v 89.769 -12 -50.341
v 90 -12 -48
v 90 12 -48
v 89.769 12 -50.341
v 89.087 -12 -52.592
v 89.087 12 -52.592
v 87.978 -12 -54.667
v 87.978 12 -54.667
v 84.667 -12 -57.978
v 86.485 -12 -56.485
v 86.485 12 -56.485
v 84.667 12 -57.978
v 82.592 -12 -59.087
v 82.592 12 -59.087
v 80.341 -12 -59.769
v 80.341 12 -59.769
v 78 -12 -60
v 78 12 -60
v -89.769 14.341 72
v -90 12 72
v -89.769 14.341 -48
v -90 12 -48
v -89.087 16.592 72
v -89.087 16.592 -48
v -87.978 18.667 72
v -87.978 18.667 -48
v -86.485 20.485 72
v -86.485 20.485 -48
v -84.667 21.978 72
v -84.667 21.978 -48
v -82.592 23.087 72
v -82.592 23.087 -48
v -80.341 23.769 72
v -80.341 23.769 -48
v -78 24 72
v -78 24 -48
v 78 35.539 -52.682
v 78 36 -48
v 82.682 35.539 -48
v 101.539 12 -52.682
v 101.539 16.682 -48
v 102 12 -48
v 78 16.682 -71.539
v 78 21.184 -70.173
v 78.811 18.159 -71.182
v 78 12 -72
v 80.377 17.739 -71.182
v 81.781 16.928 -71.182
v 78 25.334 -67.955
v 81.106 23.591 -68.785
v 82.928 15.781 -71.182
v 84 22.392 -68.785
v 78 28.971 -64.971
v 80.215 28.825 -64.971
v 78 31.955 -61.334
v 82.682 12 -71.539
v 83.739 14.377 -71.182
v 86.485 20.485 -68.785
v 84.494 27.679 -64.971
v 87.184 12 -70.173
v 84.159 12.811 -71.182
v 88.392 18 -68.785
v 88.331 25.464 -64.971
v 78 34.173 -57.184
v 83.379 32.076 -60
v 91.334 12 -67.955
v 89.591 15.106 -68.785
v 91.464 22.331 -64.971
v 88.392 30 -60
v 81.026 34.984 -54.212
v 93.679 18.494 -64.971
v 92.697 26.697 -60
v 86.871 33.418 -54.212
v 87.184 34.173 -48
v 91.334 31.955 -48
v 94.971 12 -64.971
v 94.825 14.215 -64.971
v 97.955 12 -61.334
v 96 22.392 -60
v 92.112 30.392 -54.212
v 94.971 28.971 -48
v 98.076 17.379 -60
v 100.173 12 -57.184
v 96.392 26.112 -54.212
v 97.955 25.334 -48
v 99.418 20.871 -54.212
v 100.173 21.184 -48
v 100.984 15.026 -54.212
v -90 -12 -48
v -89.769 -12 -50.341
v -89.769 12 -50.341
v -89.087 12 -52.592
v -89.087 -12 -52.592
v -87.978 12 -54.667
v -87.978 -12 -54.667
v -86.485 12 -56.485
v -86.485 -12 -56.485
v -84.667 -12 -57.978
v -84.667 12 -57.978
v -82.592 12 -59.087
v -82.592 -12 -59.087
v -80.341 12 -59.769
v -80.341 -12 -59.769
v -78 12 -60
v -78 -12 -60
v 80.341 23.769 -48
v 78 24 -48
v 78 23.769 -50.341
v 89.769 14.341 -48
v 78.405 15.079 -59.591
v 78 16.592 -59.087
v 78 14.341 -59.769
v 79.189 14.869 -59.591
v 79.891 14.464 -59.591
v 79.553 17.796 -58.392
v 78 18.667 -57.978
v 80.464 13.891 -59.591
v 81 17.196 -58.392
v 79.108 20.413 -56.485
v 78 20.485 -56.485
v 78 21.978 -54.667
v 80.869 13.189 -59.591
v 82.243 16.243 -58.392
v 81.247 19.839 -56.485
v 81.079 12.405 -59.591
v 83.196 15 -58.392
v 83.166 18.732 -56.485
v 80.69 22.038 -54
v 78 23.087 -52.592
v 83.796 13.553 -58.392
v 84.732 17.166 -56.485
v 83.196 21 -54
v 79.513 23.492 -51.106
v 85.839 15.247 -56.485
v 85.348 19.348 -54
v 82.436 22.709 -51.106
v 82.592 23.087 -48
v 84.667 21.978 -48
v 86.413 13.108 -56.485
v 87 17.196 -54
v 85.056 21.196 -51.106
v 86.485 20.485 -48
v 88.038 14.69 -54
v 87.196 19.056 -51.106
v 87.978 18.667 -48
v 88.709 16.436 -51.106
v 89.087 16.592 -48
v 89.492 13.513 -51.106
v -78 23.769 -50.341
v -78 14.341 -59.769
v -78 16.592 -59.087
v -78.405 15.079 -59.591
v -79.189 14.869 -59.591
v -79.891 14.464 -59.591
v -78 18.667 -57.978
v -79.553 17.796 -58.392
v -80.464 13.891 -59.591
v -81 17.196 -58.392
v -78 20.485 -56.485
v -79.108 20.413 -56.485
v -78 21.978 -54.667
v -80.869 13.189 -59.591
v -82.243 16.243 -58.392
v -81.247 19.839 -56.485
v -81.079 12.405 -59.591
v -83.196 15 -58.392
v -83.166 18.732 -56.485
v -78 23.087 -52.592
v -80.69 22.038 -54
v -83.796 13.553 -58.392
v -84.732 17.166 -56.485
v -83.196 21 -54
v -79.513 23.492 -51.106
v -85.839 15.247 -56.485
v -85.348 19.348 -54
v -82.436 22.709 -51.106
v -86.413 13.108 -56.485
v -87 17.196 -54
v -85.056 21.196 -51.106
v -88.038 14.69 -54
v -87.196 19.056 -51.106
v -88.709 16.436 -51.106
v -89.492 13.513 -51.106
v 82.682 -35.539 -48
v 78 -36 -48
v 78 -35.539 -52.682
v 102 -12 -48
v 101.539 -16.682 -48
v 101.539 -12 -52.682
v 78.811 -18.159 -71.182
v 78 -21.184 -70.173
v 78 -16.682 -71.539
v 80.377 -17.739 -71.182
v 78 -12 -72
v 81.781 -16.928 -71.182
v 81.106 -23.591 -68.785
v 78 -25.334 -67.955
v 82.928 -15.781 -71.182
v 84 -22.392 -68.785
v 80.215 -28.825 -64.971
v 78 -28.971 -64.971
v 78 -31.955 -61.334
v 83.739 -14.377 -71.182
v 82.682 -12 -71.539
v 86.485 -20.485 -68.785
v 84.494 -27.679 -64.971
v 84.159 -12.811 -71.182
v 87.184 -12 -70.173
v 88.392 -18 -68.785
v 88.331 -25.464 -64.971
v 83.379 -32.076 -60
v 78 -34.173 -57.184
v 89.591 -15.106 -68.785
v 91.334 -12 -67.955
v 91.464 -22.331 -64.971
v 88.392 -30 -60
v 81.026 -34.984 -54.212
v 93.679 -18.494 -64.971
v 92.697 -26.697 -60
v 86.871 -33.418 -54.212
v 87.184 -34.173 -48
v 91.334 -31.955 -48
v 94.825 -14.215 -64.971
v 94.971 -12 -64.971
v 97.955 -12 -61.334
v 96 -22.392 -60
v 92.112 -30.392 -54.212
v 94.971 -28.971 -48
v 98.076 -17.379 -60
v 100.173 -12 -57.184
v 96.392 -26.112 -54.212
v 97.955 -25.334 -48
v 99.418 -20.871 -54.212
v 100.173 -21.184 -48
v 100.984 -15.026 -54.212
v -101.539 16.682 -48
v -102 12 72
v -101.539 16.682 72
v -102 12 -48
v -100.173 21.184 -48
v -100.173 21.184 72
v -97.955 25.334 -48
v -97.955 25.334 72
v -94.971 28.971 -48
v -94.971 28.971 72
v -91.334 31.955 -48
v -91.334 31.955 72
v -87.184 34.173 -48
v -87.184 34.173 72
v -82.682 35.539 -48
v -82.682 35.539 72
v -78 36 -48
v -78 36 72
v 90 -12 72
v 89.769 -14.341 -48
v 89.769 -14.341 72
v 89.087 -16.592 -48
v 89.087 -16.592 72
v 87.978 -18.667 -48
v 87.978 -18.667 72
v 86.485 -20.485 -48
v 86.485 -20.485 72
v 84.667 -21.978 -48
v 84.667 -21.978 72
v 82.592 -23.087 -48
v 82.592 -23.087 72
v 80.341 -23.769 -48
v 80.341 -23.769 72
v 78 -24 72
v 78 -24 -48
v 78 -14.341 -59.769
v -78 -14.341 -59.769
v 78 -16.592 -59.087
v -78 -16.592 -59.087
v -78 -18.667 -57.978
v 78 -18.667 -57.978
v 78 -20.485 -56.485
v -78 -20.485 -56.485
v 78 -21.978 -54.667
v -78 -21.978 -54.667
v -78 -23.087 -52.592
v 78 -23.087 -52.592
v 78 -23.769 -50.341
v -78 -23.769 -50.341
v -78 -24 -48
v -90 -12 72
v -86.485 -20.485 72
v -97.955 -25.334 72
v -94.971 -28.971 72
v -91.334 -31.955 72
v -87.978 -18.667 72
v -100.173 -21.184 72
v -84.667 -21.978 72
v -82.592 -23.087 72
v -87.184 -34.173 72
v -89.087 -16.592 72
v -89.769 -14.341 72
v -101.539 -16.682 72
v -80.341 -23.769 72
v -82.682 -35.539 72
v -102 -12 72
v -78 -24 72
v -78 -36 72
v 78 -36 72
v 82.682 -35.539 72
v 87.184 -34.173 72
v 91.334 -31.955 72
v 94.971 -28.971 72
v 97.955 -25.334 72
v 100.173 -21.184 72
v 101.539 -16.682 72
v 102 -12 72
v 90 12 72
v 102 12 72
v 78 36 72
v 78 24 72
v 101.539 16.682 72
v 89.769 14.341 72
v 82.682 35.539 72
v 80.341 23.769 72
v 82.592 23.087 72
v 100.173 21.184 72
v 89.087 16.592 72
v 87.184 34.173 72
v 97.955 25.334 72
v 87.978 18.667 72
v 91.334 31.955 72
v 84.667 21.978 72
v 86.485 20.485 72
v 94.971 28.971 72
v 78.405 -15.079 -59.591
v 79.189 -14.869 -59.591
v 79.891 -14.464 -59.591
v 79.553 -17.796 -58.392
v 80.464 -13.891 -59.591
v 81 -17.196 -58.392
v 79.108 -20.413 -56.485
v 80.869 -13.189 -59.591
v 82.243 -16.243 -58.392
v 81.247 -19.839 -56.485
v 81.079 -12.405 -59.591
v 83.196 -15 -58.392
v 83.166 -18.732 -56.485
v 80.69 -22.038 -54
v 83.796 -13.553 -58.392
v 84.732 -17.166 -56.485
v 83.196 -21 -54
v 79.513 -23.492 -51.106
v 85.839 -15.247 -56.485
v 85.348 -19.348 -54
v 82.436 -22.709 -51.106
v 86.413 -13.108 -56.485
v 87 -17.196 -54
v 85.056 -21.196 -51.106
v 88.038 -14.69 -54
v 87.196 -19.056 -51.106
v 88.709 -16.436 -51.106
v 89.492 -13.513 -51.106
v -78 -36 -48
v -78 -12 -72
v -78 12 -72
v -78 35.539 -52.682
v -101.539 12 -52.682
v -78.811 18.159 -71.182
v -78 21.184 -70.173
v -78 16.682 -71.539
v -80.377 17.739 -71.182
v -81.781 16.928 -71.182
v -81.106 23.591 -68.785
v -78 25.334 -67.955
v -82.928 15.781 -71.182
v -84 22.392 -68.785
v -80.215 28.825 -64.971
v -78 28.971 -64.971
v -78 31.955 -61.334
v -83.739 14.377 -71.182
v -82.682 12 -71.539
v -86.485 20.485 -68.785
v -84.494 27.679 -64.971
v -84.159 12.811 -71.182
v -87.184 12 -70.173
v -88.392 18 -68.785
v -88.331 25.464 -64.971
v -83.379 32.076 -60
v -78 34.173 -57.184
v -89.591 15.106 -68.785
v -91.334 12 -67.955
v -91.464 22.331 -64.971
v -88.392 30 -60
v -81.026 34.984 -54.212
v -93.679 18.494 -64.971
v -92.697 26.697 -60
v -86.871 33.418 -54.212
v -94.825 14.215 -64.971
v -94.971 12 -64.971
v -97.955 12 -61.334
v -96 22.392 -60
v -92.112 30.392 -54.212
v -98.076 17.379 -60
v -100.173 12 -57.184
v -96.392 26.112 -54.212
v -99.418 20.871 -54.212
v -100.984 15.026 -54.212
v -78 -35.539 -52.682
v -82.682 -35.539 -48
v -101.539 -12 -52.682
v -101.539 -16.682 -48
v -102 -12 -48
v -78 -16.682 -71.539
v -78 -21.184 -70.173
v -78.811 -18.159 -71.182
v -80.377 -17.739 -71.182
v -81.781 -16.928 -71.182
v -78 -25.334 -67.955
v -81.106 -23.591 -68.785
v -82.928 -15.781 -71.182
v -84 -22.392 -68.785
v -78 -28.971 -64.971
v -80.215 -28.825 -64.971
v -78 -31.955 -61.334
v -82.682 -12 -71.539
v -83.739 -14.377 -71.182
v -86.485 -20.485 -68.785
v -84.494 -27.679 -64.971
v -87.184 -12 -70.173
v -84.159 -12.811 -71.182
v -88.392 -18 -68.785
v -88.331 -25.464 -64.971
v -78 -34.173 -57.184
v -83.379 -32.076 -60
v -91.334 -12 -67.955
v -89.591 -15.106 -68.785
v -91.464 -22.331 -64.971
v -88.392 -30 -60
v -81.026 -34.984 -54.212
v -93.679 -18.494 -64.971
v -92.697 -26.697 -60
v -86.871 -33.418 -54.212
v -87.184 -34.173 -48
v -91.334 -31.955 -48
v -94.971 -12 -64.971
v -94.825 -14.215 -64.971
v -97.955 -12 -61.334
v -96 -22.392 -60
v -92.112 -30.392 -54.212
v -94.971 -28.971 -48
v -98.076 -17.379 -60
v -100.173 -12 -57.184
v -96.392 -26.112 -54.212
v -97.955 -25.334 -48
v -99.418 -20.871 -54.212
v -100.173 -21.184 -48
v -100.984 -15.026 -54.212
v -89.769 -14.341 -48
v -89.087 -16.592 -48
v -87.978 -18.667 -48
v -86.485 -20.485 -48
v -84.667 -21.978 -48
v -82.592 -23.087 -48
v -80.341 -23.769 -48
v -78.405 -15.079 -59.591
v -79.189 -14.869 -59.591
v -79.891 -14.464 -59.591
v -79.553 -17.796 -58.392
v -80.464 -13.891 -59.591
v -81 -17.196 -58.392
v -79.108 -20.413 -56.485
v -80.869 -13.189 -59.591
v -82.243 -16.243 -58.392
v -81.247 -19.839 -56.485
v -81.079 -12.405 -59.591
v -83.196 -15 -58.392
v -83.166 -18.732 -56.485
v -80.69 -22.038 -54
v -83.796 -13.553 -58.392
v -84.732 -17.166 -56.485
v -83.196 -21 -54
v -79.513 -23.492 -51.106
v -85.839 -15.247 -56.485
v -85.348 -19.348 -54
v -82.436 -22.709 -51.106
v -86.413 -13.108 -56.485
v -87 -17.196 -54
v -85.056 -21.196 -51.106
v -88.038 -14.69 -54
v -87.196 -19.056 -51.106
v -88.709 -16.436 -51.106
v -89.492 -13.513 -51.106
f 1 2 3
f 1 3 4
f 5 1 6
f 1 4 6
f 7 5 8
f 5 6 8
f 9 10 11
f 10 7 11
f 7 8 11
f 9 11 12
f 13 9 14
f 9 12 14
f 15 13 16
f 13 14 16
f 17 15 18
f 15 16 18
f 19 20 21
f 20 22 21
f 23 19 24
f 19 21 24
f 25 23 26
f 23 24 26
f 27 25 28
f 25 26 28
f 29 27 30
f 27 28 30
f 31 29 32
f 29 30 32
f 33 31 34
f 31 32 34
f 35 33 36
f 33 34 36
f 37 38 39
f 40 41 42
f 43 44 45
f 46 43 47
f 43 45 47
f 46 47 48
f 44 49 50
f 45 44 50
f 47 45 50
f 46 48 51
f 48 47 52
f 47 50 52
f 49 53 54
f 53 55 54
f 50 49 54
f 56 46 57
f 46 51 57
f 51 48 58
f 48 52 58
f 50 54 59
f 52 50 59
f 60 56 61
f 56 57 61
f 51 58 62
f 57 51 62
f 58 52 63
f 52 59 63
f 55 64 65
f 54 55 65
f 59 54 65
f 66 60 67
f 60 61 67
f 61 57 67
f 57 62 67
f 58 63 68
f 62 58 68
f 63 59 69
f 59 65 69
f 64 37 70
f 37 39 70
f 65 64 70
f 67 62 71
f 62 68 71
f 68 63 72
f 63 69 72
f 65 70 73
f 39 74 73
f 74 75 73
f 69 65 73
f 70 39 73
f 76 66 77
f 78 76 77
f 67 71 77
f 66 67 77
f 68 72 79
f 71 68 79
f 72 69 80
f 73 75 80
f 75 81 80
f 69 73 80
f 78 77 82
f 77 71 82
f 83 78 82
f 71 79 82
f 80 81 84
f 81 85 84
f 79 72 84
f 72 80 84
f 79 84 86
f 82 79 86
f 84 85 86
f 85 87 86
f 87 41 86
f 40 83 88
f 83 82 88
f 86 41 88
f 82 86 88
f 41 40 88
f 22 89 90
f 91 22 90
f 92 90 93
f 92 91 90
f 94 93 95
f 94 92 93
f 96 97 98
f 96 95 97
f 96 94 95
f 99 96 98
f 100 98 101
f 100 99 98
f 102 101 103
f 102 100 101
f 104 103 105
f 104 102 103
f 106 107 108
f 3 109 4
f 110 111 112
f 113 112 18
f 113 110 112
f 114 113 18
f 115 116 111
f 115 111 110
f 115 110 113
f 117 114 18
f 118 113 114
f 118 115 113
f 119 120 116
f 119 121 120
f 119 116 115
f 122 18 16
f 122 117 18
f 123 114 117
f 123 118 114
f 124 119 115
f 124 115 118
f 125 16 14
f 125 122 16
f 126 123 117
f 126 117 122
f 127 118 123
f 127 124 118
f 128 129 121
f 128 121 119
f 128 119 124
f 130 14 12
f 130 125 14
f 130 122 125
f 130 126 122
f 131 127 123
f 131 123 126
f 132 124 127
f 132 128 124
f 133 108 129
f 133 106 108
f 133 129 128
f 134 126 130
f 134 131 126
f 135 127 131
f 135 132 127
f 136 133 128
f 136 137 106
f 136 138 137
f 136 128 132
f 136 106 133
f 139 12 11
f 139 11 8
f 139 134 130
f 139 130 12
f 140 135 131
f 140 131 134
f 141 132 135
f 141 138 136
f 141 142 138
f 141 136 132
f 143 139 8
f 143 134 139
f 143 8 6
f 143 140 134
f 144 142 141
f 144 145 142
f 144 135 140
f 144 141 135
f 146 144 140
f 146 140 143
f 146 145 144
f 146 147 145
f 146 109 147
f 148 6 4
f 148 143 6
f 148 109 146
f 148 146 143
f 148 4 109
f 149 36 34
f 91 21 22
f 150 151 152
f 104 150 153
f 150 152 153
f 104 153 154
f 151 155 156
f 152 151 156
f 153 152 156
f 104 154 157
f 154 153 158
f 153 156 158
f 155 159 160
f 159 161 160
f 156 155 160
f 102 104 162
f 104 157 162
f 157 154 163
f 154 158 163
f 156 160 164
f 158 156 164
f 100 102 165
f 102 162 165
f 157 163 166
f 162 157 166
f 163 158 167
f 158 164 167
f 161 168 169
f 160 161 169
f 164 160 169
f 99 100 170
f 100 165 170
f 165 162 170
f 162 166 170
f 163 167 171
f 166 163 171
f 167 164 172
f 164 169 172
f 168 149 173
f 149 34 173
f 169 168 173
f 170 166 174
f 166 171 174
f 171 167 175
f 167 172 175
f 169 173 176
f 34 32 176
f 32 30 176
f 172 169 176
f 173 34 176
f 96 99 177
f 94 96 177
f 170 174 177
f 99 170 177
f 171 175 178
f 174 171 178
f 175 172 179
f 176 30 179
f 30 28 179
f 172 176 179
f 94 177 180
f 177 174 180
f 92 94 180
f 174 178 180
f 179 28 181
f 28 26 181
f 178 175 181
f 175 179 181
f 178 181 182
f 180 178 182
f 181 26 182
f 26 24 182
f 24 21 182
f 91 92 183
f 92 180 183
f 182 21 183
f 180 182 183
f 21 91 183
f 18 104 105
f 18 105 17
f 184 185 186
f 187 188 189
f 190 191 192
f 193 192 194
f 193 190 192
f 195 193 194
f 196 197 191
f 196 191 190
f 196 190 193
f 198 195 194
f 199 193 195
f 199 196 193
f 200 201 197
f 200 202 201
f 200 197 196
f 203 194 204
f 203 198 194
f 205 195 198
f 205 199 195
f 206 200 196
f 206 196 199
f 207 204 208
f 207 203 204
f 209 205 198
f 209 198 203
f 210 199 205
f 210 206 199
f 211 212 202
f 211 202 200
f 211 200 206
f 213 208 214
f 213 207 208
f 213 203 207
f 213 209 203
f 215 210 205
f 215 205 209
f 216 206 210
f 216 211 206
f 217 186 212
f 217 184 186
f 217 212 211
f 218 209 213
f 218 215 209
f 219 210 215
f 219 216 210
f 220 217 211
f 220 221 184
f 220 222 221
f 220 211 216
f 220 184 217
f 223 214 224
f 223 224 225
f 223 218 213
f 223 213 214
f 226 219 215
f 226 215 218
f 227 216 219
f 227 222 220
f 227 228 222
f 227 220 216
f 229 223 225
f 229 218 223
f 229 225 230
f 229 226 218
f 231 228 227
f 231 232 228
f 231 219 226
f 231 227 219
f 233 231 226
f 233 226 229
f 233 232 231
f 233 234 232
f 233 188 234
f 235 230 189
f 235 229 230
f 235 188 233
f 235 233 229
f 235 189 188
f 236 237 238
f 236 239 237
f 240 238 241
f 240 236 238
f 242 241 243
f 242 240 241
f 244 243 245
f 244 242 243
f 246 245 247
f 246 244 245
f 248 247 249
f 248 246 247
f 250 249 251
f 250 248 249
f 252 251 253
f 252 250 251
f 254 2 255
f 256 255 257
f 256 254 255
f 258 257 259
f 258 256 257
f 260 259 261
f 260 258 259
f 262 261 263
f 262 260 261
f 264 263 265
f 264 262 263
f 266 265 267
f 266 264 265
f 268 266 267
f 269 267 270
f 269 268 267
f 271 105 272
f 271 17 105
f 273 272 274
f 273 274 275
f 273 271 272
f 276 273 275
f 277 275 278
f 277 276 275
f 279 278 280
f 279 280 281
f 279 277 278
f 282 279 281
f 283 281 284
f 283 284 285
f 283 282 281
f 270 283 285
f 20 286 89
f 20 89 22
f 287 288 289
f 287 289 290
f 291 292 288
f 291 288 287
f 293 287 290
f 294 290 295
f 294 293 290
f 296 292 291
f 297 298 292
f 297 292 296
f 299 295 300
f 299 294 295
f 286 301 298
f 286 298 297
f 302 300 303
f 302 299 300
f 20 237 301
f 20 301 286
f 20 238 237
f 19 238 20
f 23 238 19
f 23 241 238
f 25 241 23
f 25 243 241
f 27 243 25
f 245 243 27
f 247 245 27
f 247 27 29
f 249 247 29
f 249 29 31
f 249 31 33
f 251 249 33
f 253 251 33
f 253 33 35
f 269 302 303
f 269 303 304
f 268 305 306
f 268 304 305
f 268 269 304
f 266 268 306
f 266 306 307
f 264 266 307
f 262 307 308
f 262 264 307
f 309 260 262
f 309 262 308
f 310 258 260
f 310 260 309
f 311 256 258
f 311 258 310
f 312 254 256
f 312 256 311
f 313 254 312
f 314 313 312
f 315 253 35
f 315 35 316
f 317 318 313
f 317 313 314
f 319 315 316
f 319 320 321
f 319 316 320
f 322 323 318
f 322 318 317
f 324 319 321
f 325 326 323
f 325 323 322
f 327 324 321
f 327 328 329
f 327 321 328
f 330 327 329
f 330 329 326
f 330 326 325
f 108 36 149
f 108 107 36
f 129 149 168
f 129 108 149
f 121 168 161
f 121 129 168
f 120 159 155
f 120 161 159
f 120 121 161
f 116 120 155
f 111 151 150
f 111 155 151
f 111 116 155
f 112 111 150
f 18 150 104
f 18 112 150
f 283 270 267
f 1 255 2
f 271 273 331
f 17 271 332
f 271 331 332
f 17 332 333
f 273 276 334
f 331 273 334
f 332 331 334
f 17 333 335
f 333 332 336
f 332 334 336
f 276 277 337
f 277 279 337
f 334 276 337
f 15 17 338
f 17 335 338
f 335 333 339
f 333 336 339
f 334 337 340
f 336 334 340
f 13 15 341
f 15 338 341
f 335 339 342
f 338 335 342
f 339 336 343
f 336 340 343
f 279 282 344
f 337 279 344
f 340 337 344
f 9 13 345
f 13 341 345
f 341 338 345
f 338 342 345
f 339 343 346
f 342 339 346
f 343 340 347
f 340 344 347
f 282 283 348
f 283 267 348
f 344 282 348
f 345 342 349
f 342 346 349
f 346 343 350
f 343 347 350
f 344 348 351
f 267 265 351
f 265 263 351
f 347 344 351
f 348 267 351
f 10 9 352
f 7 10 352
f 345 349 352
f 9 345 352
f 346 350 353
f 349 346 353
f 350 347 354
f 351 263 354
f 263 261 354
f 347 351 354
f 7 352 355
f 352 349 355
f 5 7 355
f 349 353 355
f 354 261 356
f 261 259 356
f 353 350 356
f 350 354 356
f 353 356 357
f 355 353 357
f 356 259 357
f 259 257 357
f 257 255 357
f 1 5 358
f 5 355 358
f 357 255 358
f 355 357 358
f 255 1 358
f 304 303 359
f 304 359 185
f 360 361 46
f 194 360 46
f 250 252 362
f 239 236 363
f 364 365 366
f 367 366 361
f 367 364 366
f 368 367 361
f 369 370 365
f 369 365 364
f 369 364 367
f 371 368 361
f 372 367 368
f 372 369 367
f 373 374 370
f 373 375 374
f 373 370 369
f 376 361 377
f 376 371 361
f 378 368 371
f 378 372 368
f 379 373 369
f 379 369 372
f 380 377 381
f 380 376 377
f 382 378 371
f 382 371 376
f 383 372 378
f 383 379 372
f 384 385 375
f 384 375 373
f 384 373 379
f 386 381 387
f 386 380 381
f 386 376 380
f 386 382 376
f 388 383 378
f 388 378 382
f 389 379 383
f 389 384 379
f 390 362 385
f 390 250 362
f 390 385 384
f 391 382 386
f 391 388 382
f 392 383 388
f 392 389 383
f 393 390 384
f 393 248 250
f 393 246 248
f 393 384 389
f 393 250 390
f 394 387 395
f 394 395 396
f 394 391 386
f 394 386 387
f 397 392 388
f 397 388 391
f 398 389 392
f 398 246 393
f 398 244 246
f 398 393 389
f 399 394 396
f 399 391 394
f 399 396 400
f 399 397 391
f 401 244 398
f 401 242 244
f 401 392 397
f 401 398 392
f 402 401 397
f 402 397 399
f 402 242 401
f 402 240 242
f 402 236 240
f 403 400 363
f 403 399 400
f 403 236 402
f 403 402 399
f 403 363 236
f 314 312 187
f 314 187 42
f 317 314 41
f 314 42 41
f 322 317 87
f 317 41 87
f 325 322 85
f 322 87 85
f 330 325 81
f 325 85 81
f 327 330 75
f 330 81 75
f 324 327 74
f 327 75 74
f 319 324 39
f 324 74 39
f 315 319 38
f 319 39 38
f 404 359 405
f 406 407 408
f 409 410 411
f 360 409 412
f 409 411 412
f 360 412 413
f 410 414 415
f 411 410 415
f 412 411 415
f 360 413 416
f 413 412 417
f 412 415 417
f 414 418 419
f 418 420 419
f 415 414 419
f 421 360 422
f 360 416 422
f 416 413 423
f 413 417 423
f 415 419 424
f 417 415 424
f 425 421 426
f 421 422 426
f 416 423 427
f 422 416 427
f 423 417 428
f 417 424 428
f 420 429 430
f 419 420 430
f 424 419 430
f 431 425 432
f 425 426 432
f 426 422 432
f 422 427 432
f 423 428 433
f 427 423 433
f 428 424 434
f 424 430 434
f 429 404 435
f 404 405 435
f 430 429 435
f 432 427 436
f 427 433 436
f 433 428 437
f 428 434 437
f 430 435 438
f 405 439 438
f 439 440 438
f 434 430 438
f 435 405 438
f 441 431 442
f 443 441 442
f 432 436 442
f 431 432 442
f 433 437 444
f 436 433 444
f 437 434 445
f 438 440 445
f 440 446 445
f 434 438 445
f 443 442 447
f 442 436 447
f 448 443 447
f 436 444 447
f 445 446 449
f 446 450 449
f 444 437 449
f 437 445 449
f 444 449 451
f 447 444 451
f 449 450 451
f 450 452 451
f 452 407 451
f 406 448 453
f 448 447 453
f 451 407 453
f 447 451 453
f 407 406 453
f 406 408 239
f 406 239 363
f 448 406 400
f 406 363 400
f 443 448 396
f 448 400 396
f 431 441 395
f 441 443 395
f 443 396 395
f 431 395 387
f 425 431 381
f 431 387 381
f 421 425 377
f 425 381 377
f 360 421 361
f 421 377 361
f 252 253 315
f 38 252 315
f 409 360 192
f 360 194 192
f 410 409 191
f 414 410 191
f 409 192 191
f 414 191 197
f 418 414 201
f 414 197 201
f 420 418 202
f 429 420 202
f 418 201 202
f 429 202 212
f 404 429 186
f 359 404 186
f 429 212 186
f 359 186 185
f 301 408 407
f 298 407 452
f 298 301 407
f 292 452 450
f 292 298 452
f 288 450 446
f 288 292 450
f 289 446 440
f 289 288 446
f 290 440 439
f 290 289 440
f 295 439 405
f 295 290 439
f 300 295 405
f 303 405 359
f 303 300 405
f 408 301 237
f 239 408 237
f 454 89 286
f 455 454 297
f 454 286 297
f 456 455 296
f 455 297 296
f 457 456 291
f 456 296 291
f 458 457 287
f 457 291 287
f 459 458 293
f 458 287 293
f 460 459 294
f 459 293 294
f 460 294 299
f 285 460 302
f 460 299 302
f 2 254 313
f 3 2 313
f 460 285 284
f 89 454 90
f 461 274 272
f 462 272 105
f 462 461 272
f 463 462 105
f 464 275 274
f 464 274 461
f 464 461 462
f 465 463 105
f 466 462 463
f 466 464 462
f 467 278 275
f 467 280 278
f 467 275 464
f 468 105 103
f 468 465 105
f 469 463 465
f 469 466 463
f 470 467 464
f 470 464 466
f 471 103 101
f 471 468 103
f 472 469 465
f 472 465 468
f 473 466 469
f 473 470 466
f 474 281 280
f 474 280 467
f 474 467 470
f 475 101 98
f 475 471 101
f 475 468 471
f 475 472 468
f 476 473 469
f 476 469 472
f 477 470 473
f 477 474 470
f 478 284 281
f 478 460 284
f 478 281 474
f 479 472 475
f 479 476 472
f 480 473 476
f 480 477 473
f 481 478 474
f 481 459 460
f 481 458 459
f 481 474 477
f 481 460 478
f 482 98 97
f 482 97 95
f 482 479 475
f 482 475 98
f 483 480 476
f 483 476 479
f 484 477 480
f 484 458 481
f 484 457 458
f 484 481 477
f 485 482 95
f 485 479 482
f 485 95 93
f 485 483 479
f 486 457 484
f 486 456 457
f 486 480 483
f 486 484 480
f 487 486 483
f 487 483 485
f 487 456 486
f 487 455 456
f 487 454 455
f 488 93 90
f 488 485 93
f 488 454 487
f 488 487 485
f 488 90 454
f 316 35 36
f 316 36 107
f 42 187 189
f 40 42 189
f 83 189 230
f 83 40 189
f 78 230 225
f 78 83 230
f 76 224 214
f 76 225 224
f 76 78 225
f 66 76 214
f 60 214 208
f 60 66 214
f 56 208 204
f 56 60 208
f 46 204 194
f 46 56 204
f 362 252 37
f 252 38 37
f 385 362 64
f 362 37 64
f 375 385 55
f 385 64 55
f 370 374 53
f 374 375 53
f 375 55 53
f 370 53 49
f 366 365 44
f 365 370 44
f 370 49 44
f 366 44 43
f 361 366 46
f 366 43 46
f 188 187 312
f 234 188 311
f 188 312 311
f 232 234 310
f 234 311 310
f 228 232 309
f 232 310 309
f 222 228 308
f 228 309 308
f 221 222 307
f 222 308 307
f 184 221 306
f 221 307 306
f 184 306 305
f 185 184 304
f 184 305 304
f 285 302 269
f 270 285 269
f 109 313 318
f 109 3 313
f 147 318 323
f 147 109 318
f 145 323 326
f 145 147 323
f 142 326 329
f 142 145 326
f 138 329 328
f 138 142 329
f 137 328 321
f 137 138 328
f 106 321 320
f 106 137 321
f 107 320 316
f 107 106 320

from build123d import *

# Parameters (mm, degrees)
F0_W     = 170
F0_H     = 60
F1_DEPTH = 60
F2_R     = 20
F3_T     = -10
F4_SCALE = 1.2


with BuildPart() as f1:
    # F0 (on Top) → F1 (new body, symmetric)
    with BuildSketch(Plane.XY):
        Rectangle(F0_W, F0_H)
    extrude(amount=F1_DEPTH, both=True)

    # F2
    f2_edges = [f1.edges().sort_by_distance(p)[0] for p in [
        (-85, -30, 0),
        (-85, 30, 0),
        (85, -30, 0),
        (85, 30, 0),
        (0, 30, -60),
        (0, -30, -60),
        (-85, 0, -60),
        (85, 0, -60),
    ]]
    fillet(f2_edges, radius=F2_R)

    # F3
    f3_openings = [f1.faces().sort_by_distance(p)[0] for p in [
        (0, 0, 60),
    ]]
    offset(amount=F3_T, openings=f3_openings)


with BuildPart() as f1_1:
    # F4: moved
    add(f1.part.scale(F4_SCALE))


solid = f1_1.part
